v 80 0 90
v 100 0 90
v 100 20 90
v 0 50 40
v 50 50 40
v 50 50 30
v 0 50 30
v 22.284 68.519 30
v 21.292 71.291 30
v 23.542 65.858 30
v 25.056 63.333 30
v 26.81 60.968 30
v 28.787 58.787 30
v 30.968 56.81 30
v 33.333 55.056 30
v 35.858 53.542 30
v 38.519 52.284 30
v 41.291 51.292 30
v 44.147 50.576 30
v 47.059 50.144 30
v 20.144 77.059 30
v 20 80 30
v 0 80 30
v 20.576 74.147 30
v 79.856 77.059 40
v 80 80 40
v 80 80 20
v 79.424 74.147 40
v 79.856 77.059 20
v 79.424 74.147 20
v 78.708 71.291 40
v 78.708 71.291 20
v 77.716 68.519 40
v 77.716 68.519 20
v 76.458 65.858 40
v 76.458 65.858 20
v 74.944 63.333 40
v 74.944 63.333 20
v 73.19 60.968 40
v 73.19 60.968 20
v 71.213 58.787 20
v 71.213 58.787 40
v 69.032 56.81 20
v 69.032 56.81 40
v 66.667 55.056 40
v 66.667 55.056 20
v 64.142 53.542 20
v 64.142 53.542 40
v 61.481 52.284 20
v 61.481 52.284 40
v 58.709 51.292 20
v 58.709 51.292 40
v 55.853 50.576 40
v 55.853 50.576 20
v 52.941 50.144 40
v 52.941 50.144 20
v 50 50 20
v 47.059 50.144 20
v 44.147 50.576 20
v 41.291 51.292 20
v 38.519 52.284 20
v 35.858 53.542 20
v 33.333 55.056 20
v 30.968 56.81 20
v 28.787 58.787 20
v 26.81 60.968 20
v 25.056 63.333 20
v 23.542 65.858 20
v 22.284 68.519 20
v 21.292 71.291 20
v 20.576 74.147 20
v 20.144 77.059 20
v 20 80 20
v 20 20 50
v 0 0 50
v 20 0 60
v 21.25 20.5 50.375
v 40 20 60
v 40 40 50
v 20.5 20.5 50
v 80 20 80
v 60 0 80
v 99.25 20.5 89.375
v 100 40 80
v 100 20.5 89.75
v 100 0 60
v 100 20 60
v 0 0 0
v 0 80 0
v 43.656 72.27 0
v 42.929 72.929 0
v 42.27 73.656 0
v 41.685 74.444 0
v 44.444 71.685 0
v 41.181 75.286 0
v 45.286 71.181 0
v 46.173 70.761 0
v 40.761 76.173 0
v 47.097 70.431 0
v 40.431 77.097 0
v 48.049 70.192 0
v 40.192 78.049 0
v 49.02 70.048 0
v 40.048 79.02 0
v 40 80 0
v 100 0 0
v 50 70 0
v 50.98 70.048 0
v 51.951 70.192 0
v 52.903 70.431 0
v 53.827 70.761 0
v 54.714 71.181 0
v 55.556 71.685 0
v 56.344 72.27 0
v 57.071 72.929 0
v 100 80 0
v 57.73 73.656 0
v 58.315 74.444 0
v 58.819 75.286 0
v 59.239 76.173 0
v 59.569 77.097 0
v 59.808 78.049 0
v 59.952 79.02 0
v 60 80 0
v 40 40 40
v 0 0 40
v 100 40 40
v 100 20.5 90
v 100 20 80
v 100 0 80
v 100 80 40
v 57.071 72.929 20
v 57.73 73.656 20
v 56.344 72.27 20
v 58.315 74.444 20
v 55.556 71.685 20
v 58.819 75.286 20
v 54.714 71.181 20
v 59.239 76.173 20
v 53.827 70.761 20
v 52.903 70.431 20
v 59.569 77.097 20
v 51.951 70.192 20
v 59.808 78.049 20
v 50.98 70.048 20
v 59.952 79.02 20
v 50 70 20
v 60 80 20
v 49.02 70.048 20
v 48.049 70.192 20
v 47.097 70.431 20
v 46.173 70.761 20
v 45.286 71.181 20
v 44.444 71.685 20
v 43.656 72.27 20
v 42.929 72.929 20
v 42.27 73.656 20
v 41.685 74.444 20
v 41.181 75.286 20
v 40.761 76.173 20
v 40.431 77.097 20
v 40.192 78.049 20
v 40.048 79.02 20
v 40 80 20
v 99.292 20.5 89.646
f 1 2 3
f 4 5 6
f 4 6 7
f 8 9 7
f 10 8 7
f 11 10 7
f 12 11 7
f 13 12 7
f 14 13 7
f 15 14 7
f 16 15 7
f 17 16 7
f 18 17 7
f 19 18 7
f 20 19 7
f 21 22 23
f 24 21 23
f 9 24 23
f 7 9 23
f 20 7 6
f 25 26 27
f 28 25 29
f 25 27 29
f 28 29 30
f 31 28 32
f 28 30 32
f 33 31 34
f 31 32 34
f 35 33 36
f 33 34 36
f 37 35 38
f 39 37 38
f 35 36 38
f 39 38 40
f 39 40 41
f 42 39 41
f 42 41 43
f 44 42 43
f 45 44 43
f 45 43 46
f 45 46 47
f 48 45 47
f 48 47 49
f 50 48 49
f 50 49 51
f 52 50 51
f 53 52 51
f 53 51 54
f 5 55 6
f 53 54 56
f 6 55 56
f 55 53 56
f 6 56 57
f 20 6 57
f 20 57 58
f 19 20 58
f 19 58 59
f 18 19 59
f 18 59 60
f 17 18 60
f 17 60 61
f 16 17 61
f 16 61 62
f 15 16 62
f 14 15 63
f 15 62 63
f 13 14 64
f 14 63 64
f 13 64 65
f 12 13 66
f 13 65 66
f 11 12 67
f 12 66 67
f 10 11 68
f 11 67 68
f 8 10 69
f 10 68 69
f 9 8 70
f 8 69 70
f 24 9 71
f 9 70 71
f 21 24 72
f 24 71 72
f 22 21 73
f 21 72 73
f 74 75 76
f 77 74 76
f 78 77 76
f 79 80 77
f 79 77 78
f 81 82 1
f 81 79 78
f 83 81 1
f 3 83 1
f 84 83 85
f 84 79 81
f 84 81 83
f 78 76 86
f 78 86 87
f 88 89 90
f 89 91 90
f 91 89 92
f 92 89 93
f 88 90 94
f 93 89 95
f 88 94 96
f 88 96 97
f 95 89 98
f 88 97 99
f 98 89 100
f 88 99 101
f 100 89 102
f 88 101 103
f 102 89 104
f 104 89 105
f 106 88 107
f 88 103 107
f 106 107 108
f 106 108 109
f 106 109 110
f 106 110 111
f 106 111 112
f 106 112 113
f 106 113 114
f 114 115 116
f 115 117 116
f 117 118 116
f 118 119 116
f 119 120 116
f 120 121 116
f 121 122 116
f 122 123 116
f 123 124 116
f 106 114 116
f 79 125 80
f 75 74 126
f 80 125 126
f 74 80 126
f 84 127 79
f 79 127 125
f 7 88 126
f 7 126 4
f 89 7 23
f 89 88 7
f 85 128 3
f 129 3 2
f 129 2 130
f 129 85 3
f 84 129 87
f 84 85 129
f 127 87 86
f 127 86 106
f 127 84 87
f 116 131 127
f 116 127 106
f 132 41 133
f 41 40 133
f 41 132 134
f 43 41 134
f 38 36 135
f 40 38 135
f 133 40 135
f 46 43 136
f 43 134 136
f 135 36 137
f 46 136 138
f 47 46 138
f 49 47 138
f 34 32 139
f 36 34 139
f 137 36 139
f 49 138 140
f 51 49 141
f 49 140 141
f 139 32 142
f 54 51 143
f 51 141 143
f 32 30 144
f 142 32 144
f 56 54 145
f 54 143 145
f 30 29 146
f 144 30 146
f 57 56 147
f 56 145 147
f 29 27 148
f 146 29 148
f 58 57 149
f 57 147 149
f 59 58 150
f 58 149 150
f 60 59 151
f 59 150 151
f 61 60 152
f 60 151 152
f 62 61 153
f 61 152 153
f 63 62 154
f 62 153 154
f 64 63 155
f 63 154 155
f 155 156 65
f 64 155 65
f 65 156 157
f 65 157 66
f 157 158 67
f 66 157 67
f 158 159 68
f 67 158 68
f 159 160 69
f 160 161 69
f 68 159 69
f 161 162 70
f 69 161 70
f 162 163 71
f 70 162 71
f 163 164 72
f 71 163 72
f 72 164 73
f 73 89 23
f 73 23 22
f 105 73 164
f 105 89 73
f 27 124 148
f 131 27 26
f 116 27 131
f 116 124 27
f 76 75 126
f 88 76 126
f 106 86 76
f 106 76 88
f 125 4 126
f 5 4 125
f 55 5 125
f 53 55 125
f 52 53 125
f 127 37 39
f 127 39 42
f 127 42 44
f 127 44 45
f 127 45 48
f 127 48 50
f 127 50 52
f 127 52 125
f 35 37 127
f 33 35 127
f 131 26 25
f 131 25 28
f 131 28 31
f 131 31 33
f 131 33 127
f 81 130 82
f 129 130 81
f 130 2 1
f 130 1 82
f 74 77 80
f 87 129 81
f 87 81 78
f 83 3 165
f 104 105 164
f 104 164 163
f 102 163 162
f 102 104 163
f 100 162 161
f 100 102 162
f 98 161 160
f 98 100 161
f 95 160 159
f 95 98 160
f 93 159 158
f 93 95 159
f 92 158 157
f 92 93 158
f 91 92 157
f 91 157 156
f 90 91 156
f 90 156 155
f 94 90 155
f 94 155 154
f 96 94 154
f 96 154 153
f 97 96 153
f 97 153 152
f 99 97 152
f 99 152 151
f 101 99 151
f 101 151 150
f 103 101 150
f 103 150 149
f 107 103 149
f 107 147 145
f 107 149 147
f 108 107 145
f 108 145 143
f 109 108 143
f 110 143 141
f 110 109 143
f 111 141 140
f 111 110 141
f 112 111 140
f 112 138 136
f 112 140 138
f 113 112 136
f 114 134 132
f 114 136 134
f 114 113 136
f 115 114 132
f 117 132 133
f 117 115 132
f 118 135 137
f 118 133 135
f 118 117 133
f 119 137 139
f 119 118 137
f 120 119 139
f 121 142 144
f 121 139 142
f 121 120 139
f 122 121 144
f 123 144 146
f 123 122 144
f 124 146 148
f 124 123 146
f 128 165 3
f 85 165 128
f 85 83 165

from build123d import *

# Parameters (mm, degrees)
SKETCH1_W            = 100
SKETCH1_H            = 80
BOSS_EXTRUDE1_DEPTH  = 90
CUT_EXTRUDE1_DEPTH   = 90
SKETCH4_W            = 20
SKETCH4_H            = 20
CUT_EXTRUDE2_DEPTH   = 90
CUT_EXTRUDE3_DEPTH   = 90
CUT_EXTRUDE4_DEPTH   = 90
SKETCH7_W            = 100
SKETCH7_H            = 40
CUT_EXTRUDE5_DEPTH   = 90
CUT_EXTRUDE6_DEPTH   = 10
CUT_EXTRUDE7_DEPTH   = 94
SKETCH10_W           = 100
SKETCH10_H           = 50
CUT_EXTRUDE8_DEPTH   = 94
BOSS_EXTRUDE2_DEPTH  = 40
BOSS_EXTRUDE4_DEPTH  = 10
BOSS_EXTRUDE5_DEPTH  = 10
BOSS_EXTRUDE9_DEPTH  = 10
SKETCH22_W           = 13.645756347
SKETCH22_H           = 19.751560391
CUT_EXTRUDE12_DEPTH  = 57
BOSS_EXTRUDE13_DEPTH = 20
BOSS_EXTRUDE14_DEPTH = 20
SKETCH25_W           = 10
SKETCH25_H           = 20
BOSS_EXTRUDE16_DEPTH = 40
CUT_EXTRUDE13_DEPTH  = 40
CUT_EXTRUDE14_DEPTH  = 40
CUT_EXTRUDE15_DEPTH  = 40
CUT_EXTRUDE16_DEPTH  = 40
SKETCH30_W           = 20
SKETCH30_H           = 19.999
CUT_EXTRUDE18_DEPTH  = 125
BOSS_EXTRUDE25_DEPTH = 0.5
CUT_EXTRUDE21_DEPTH  = 0.5
CUT_EXTRUDE22_DEPTH  = 2.5
SKETCH36_W           = 1.148729496
SKETCH36_H           = 4.006964713
BOSS_EXTRUDE26_DEPTH = 2.5
CUT_EXTRUDE23_DEPTH  = 2.5
CUT_EXTRUDE24_DEPTH  = 2.5
SKETCH40_W           = 100
SKETCH40_H           = 60
CUT_EXTRUDE25_DEPTH  = 39.5
BOSS_EXTRUDE31_DEPTH = 80
SKETCH45_W           = 90
SKETCH45_H           = 80
CUT_EXTRUDE27_DEPTH  = 80
SKETCH46_W           = 100
SKETCH46_H           = 50
CUT_EXTRUDE28_DEPTH  = 80
CUT_EXTRUDE29_DEPTH  = 80
CUT_EXTRUDE30_DEPTH  = 80
CUT_EXTRUDE32_DEPTH  = 80
SKETCH51_W           = 25.130664003
SKETCH51_H           = 300
CUT_EXTRUDE33_DEPTH  = 80
SKETCH52_W           = 100
SKETCH52_H           = 80
CUT_EXTRUDE34_DEPTH  = 80
CUT_EXTRUDE35_DEPTH  = 80
CUT_EXTRUDE36_DEPTH  = 80
CUT_EXTRUDE37_DEPTH  = 80
SKETCH56_W           = 16.617380904
SKETCH56_H           = 14.273809877
CUT_EXTRUDE38_DEPTH  = 80
SKETCH57_W           = 100.195151688
SKETCH57_H           = 57.157925485
CUT_EXTRUDE39_DEPTH  = 80
SKETCH58_W           = 20
SKETCH58_H           = 20
CUT_EXTRUDE40_DEPTH  = 80


with BuildPart() as part:
    # Sketch1 → Boss-Extrude1 (new body)
    with BuildSketch(Plane.XY):
        with Locations((50, 40)):
            Rectangle(SKETCH1_W, SKETCH1_H)
    extrude(amount=BOSS_EXTRUDE1_DEPTH)

    # Sketch3 → Cut-Extrude1 (cut)
    with BuildSketch(Plane(origin=(0, 80, 0), x_dir=(1, 0, 0), z_dir=(0, 1, 0))):
        Polygon((0, -50), (20, -60), (40, -60), (80, -80), (60, -80), (80, -90), (0, -90), align=None)
    extrude(amount=-CUT_EXTRUDE1_DEPTH, mode=Mode.SUBTRACT)

    # Sketch4 → Cut-Extrude2 (cut)
    with BuildSketch(Plane(origin=(100, 0, 0), x_dir=(0, 0, -1), z_dir=(1, 0, 0))):
        with Locations((-70, 10)):
            Rectangle(SKETCH4_W, SKETCH4_H)
    extrude(amount=-CUT_EXTRUDE2_DEPTH, mode=Mode.SUBTRACT)

    # Sketch5 → Cut-Extrude3 (cut)
    with BuildSketch(Plane(origin=(0, 0, 0), x_dir=(-1, 0, 0), z_dir=(0, 0, -1))):
        with BuildLine():
            Line((-60, 80), (-40, 80))
            ThreePointArc((-40, 80), (-50, 70), (-60, 80))
        make_face()
    extrude(amount=-CUT_EXTRUDE3_DEPTH, mode=Mode.SUBTRACT)

    # Sketch6 → Cut-Extrude4 (cut)
    with BuildSketch(Plane.XY.offset(20)):
        with BuildLine():
            Line((20, 80), (80, 80))
            ThreePointArc((80, 80), (50, 50), (20, 80))
        make_face()
    extrude(amount=CUT_EXTRUDE4_DEPTH, mode=Mode.SUBTRACT)

    # Sketch7 → Cut-Extrude5 (cut)
    with BuildSketch(Plane.XY.offset(40)):
        with Locations((50, 60)):
            Rectangle(SKETCH7_W, SKETCH7_H)
    extrude(amount=CUT_EXTRUDE5_DEPTH, mode=Mode.SUBTRACT)

    # Sketch8 → Cut-Extrude6 (cut)
    with BuildSketch(Plane.XY.offset(40)):
        with BuildLine():
            Line((50, 50), (0, 50))
            Line((0, 50), (0, 80))
            Line((0, 80), (20, 80))
            ThreePointArc((20, 80), (28.786796564, 58.786796564), (50, 50))
        make_face()
    extrude(amount=-CUT_EXTRUDE6_DEPTH, mode=Mode.SUBTRACT)

    # Sketch9 → Cut-Extrude7 (cut)
    with BuildSketch(Plane.XY.offset(40)):
        Polygon((40, 40), (0, 0), (0, 40), align=None)
    extrude(amount=CUT_EXTRUDE7_DEPTH, mode=Mode.SUBTRACT)

    # Sketch10 → Cut-Extrude8 (cut)
    with BuildSketch(Plane.XY.offset(50)):
        with Locations((50, 25)):
            Rectangle(SKETCH10_W, SKETCH10_H)
    extrude(amount=CUT_EXTRUDE8_DEPTH, mode=Mode.SUBTRACT)

    # Sketch11 → Boss-Extrude2 (add)
    with BuildSketch(Plane(origin=(0, 40, 0), x_dir=(1, 0, 0), z_dir=(0, 1, 0))):
        Polygon((100, -50), (100, -80), (40, -50), align=None)
    extrude(amount=-BOSS_EXTRUDE2_DEPTH)

    # Sketch15 → Boss-Extrude4 (add)
    with BuildSketch(Plane.XY.offset(50)):
        Polygon((20, 0), (40, 20), (100, 20), (100, 0), (40, 0), align=None)
    extrude(amount=BOSS_EXTRUDE4_DEPTH)

    # Sketch16 → Boss-Extrude5 (add)
    with BuildSketch(Plane(origin=(-16.666666667, 16.666666667, 33.333333333), x_dir=(-0.912870929, -0.182574186, -0.365148372), z_dir=(0.40824829, -0.40824829, -0.816496581))):
        Polygon((-62.075223184, -8.94427191), (-42.075223184, -2.913523754), (-18.257418584, -22.360679775), (-40.166320884, -26.83281573), align=None)
    extrude(amount=BOSS_EXTRUDE5_DEPTH)

    # Sketch18 → Boss-Extrude9 (add)
    with BuildSketch(Plane(origin=(0, 20, 0), x_dir=(1, 0, 0), z_dir=(0, 1, 0))):
        Polygon((40, -50), (40, -60), (21.742581416, -50), align=None)
    extrude(amount=-BOSS_EXTRUDE9_DEPTH)

    # Sketch22 → Cut-Extrude12 (cut)
    with BuildSketch(Plane(origin=(40, 0, 0), x_dir=(0, 0, -1), z_dir=(1, 0, 0))):
        with Locations((-56.822878174, 29.875780196)):
            Rectangle(SKETCH22_W, SKETCH22_H)
    extrude(amount=-CUT_EXTRUDE12_DEPTH, mode=Mode.SUBTRACT)

    # Sketch23 → Boss-Extrude13 (add)
    with BuildSketch(Plane(origin=(0, 20, 0), x_dir=(1, 0, 0), z_dir=(0, 1, 0))):
        Polygon((20, -50), (100, -90), (40, -50), align=None)
    extrude(amount=-BOSS_EXTRUDE13_DEPTH)

    # Sketch24 → Boss-Extrude14 (add)
    with BuildSketch(Plane(origin=(0, 20, 0), x_dir=(1, 0, 0), z_dir=(0, 1, 0))):
        Polygon((100, -90), (100, -80), (60, -60), (55, -60), align=None)
    extrude(amount=-BOSS_EXTRUDE14_DEPTH)

    # Sketch25 → Boss-Extrude16 (add)
    with BuildSketch(Plane(origin=(100, 0, 0), x_dir=(0, 0, -1), z_dir=(1, 0, 0))):
        with Locations((-85, 10)):
            Rectangle(SKETCH25_W, SKETCH25_H)
    extrude(amount=-BOSS_EXTRUDE16_DEPTH)

    # Sketch26 → Cut-Extrude13 (cut)
    with BuildSketch(Plane(origin=(-16.666666667, 16.666666667, 33.333333333), x_dir=(0.912870929, 0.182574186, 0.365148372), z_dir=(-0.40824829, 0.40824829, 0.816496581))):
        Polygon((105.893027784, -17.88854382), (83.984125484, -35.77708764), (105.893027784, -40.249223595), align=None)
    extrude(amount=CUT_EXTRUDE13_DEPTH, mode=Mode.SUBTRACT)

    # Sketch27 → Cut-Extrude14 (cut)
    with BuildSketch(Plane(origin=(-3.333333333, -16.666666667, 6.666666667), x_dir=(0.98319208, -0.169515876, 0.06780635), z_dir=(0.182574186, 0.912870929, -0.365148372))):
        Polygon((64.416032844, -74.278135271), (84.757937953, -83.56290218), (64.416032844, -85.048464885), align=None)
    extrude(amount=-CUT_EXTRUDE14_DEPTH, mode=Mode.SUBTRACT)

    # Sketch28 → Cut-Extrude15 (cut)
    with BuildSketch(Plane(origin=(0, 0, 80), x_dir=(-1, 0, 0), z_dir=(0, 0, -1))):
        Polygon((-80, 20), (-60, 0), (-60, 20), align=None)
    extrude(amount=-CUT_EXTRUDE15_DEPTH, mode=Mode.SUBTRACT)

    # Sketch29 → Cut-Extrude16 (cut)
    with BuildSketch(Plane(origin=(-16.666666667, 16.666666667, 33.333333333), x_dir=(-0.912870929, -0.182574186, -0.365148372), z_dir=(0.40824829, -0.40824829, -0.816496581))):
        Polygon((-105.893027784, -17.88854382), (-105.893027784, -40.249223595), (-127.801930085, -22.360679775), align=None)
    extrude(amount=-CUT_EXTRUDE16_DEPTH, mode=Mode.SUBTRACT)

    # Sketch30 → Cut-Extrude18 (cut)
    with BuildSketch(Plane(origin=(100, 0, 0), x_dir=(0, 0, -1), z_dir=(1, 0, 0))):
        with Locations((-70, 9.9995)):
            Rectangle(SKETCH30_W, SKETCH30_H)
    extrude(amount=-CUT_EXTRUDE18_DEPTH, mode=Mode.SUBTRACT)

    # Sketch31 → Boss-Extrude25 (add)
    with BuildSketch(Plane(origin=(0, 20, 0), x_dir=(1, 0, 0), z_dir=(0, 1, 0))):
        Polygon((40, -50), (20, -50), (100, -90), (100, -80), align=None)
    extrude(amount=BOSS_EXTRUDE25_DEPTH)

    # Sketch34 → Cut-Extrude21 (cut)
    with BuildSketch(Plane(origin=(-16.666666667, 16.666666667, 33.333333333), x_dir=(0.912870929, 0.182574186, 0.365148372), z_dir=(-0.40824829, 0.40824829, 0.816496581))):
        Polygon((40.166320884, -4.472135955), (127.801930085, -22.360679775), (94.938576634, 6.708203932), align=None)
    extrude(amount=CUT_EXTRUDE21_DEPTH, mode=Mode.SUBTRACT)

    # Sketch35 → Cut-Extrude22 (cut)
    with BuildSketch(Plane(origin=(2.266666667, -10.426666667, 6.346666667), x_dir=(0.98319208, 0.155954606, -0.094928891), z_dir=(0.182574186, -0.839841255, 0.51120772))):
        Polygon((19.011205483, 53.778143667), (19.307858266, 53.68916465), (18.036489196, 53.108866719), align=None)
    extrude(amount=-CUT_EXTRUDE22_DEPTH, mode=Mode.SUBTRACT)

    # Sketch36 → Boss-Extrude26 (add)
    with BuildSketch(Plane(origin=(0, 0, 0), x_dir=(0, 0, 1), z_dir=(-0.707106781, 0.707106781, 0))):
        with Locations((49.425635252, 29.062065395)):
            Rectangle(SKETCH36_W, SKETCH36_H)
    extrude(amount=-BOSS_EXTRUDE26_DEPTH)

    # Sketch37 → Cut-Extrude23 (cut)
    with BuildSketch(Plane(origin=(0, 0, 50), x_dir=(-1, 0, 0), z_dir=(0, 0, -1))):
        Polygon((-20, 20), (-20.305780347, 20.5), (-20, 20.5), align=None)
    extrude(amount=-CUT_EXTRUDE23_DEPTH, mode=Mode.SUBTRACT)

    # Sketch39 → Cut-Extrude24 (cut)
    with BuildSketch(Plane(origin=(-18.683928387, 11.426356204, 25.444702473), x_dir=(-0.830826199, -0.22798675, -0.507690722), z_dir=(0.556531965, -0.340353074, -0.757912895))):
        Polygon((-46.928838789, -1.781888159), (-47.714265377, -1.978181738), (-46.56079509, -2.238008161), align=None)
    extrude(amount=-CUT_EXTRUDE24_DEPTH, mode=Mode.SUBTRACT)

    # Sketch40 → Cut-Extrude25 (cut)
    with BuildSketch(Plane.XZ):
        with Locations((50, 30)):
            Rectangle(SKETCH40_W, SKETCH40_H)
    extrude(amount=CUT_EXTRUDE25_DEPTH, mode=Mode.SUBTRACT)

    # Sketch41 → Boss-Extrude31 (add)
    with BuildSketch(Plane(origin=(-16.666666667, 16.666666667, 33.333333333), x_dir=(0.912870929, 0.182574186, 0.365148372), z_dir=(-0.40824829, 0.40824829, 0.816496581))):
        Polygon((40.166320884, -4.472135955), (62.075223184, 13.416407865), (127.801930085, 0), (127.801930085, -22.360679775), align=None)
    extrude(amount=-BOSS_EXTRUDE31_DEPTH)

    # Sketch45 → Cut-Extrude27 (cut)
    with BuildSketch(Plane(origin=(100, 0, 0), x_dir=(0, 0, -1), z_dir=(1, 0, 0))):
        with Locations((-45, 40)):
            Rectangle(SKETCH45_W, SKETCH45_H)
    extrude(amount=CUT_EXTRUDE27_DEPTH, mode=Mode.SUBTRACT)

    # Sketch46 → Cut-Extrude28 (cut)
    with BuildSketch(Plane.XZ):
        with Locations((50, 25)):
            Rectangle(SKETCH46_W, SKETCH46_H)
    extrude(amount=CUT_EXTRUDE28_DEPTH, mode=Mode.SUBTRACT)

    # Sketch47 → Cut-Extrude29 (cut)
    with BuildSketch(Plane(origin=(0, 0, 0), x_dir=(1, 0, 0), z_dir=(0, 1, 0))):
        Polygon((120, -50), (100, -40), (100, -2.020410289), (132.659863237, -18.350341907), align=None)
    extrude(amount=-CUT_EXTRUDE29_DEPTH, mode=Mode.SUBTRACT)

    # Sketch48 → Cut-Extrude30 (cut)
    with BuildSketch(Plane(origin=(120.689655172, 0, 48.275862069), x_dir=(-0.371390676, 0, 0.928476691), z_dir=(-0.928476691, 0, -0.371390676))):
        Polygon((-32.230771602, 0), (1.856953382, 0), (-26.549484105, -12.659863237), align=None)
    extrude(amount=-CUT_EXTRUDE30_DEPTH, mode=Mode.SUBTRACT)

    # Sketch49 → Cut-Extrude32 (cut)
    with BuildSketch(Plane(origin=(-0.114281179, -0.690448792, 0.285702948), x_dir=(0.988505824, -0.139695442, 0.057805011), z_dir=(0.15118279, 0.91339602, -0.377956974))):
        Polygon((134.318019367, -17.958704237), (121.510949414, -46.200841621), (131.829451772, -17.958704237), (119.414758754, -17.958704237), (119.414758754, -48.439344206), (134.318019367, -48.439344206), align=None)
    extrude(amount=-CUT_EXTRUDE32_DEPTH, mode=Mode.SUBTRACT)

    # Sketch51 → Cut-Extrude33 (cut)
    with BuildSketch(Plane(origin=(0.666666667, 3.333333333, -1.333333333), x_dir=(-0.98319208, 0.169515876, -0.06780635), z_dir=(-0.182574186, -0.912870929, 0.365148372))):
        with Locations((-131.048534724, 103.044069574)):
            Rectangle(SKETCH51_W, SKETCH51_H)
    extrude(amount=-CUT_EXTRUDE33_DEPTH, mode=Mode.SUBTRACT)

    # Sketch52 → Cut-Extrude34 (cut)
    with BuildSketch(Plane(origin=(0, 0, 0), x_dir=(-1, 0, 0), z_dir=(0, 0, -1))):
        with Locations((-50, 40)):
            Rectangle(SKETCH52_W, SKETCH52_H)
    extrude(amount=CUT_EXTRUDE34_DEPTH, mode=Mode.SUBTRACT)

    # Sketch53 → Cut-Extrude35 (cut)
    with BuildSketch(Plane.XY):
        Polygon((100, 8), (100, 4.040820577), (103.299316186, 7.340136763), align=None)
    extrude(amount=-CUT_EXTRUDE35_DEPTH, mode=Mode.SUBTRACT)

    # Sketch54 → Cut-Extrude36 (cut)
    with BuildSketch(Plane(origin=(0, 0, 0), x_dir=(1, 0, 0), z_dir=(0, 1, 0))):
        Polygon((50, 0), (95.959179423, 0), (65.319726474, 15.319726474), align=None)
    extrude(amount=-CUT_EXTRUDE36_DEPTH, mode=Mode.SUBTRACT)

    # Sketch55 → Cut-Extrude37 (cut)
    with BuildSketch(Plane(origin=(25, 0, 25), x_dir=(0.707106781, 0, -0.707106781), z_dir=(0.707106781, 0, 0.707106781))):
        Polygon((35.355339059, 0), (35.355339059, -6), (51.052787248, -12.659863237), (57.020704011, 0), align=None)
    extrude(amount=-CUT_EXTRUDE37_DEPTH, mode=Mode.SUBTRACT)

    # Sketch56 → Cut-Extrude38 (cut)
    with BuildSketch(Plane(origin=(2.288135593, 7.627118644, -2.288135593), x_dir=(0.961108118, -0.26452517, 0.079357551), z_dir=(0.276172385, 0.920574618, -0.276172385))):
        with Locations((54.829850342, 11.734471108)):
            Rectangle(SKETCH56_W, SKETCH56_H)
    extrude(amount=-CUT_EXTRUDE38_DEPTH, mode=Mode.SUBTRACT)

    # Sketch57 → Cut-Extrude39 (cut)
    with BuildSketch(Plane(origin=(0, 0, 0), x_dir=(-1, 0, 0), z_dir=(0, 0, -1))):
        with Locations((-50.097575844, -14.861233679)):
            Rectangle(SKETCH57_W, SKETCH57_H)
    extrude(amount=CUT_EXTRUDE39_DEPTH, mode=Mode.SUBTRACT)

    # Sketch58 → Cut-Extrude40 (cut)
    with BuildSketch(Plane(origin=(100, 0, 0), x_dir=(0, 0, -1), z_dir=(1, 0, 0))):
        with Locations((-70, 10)):
            Rectangle(SKETCH58_W, SKETCH58_H)
    extrude(amount=-CUT_EXTRUDE40_DEPTH, mode=Mode.SUBTRACT)


solid = part.part
